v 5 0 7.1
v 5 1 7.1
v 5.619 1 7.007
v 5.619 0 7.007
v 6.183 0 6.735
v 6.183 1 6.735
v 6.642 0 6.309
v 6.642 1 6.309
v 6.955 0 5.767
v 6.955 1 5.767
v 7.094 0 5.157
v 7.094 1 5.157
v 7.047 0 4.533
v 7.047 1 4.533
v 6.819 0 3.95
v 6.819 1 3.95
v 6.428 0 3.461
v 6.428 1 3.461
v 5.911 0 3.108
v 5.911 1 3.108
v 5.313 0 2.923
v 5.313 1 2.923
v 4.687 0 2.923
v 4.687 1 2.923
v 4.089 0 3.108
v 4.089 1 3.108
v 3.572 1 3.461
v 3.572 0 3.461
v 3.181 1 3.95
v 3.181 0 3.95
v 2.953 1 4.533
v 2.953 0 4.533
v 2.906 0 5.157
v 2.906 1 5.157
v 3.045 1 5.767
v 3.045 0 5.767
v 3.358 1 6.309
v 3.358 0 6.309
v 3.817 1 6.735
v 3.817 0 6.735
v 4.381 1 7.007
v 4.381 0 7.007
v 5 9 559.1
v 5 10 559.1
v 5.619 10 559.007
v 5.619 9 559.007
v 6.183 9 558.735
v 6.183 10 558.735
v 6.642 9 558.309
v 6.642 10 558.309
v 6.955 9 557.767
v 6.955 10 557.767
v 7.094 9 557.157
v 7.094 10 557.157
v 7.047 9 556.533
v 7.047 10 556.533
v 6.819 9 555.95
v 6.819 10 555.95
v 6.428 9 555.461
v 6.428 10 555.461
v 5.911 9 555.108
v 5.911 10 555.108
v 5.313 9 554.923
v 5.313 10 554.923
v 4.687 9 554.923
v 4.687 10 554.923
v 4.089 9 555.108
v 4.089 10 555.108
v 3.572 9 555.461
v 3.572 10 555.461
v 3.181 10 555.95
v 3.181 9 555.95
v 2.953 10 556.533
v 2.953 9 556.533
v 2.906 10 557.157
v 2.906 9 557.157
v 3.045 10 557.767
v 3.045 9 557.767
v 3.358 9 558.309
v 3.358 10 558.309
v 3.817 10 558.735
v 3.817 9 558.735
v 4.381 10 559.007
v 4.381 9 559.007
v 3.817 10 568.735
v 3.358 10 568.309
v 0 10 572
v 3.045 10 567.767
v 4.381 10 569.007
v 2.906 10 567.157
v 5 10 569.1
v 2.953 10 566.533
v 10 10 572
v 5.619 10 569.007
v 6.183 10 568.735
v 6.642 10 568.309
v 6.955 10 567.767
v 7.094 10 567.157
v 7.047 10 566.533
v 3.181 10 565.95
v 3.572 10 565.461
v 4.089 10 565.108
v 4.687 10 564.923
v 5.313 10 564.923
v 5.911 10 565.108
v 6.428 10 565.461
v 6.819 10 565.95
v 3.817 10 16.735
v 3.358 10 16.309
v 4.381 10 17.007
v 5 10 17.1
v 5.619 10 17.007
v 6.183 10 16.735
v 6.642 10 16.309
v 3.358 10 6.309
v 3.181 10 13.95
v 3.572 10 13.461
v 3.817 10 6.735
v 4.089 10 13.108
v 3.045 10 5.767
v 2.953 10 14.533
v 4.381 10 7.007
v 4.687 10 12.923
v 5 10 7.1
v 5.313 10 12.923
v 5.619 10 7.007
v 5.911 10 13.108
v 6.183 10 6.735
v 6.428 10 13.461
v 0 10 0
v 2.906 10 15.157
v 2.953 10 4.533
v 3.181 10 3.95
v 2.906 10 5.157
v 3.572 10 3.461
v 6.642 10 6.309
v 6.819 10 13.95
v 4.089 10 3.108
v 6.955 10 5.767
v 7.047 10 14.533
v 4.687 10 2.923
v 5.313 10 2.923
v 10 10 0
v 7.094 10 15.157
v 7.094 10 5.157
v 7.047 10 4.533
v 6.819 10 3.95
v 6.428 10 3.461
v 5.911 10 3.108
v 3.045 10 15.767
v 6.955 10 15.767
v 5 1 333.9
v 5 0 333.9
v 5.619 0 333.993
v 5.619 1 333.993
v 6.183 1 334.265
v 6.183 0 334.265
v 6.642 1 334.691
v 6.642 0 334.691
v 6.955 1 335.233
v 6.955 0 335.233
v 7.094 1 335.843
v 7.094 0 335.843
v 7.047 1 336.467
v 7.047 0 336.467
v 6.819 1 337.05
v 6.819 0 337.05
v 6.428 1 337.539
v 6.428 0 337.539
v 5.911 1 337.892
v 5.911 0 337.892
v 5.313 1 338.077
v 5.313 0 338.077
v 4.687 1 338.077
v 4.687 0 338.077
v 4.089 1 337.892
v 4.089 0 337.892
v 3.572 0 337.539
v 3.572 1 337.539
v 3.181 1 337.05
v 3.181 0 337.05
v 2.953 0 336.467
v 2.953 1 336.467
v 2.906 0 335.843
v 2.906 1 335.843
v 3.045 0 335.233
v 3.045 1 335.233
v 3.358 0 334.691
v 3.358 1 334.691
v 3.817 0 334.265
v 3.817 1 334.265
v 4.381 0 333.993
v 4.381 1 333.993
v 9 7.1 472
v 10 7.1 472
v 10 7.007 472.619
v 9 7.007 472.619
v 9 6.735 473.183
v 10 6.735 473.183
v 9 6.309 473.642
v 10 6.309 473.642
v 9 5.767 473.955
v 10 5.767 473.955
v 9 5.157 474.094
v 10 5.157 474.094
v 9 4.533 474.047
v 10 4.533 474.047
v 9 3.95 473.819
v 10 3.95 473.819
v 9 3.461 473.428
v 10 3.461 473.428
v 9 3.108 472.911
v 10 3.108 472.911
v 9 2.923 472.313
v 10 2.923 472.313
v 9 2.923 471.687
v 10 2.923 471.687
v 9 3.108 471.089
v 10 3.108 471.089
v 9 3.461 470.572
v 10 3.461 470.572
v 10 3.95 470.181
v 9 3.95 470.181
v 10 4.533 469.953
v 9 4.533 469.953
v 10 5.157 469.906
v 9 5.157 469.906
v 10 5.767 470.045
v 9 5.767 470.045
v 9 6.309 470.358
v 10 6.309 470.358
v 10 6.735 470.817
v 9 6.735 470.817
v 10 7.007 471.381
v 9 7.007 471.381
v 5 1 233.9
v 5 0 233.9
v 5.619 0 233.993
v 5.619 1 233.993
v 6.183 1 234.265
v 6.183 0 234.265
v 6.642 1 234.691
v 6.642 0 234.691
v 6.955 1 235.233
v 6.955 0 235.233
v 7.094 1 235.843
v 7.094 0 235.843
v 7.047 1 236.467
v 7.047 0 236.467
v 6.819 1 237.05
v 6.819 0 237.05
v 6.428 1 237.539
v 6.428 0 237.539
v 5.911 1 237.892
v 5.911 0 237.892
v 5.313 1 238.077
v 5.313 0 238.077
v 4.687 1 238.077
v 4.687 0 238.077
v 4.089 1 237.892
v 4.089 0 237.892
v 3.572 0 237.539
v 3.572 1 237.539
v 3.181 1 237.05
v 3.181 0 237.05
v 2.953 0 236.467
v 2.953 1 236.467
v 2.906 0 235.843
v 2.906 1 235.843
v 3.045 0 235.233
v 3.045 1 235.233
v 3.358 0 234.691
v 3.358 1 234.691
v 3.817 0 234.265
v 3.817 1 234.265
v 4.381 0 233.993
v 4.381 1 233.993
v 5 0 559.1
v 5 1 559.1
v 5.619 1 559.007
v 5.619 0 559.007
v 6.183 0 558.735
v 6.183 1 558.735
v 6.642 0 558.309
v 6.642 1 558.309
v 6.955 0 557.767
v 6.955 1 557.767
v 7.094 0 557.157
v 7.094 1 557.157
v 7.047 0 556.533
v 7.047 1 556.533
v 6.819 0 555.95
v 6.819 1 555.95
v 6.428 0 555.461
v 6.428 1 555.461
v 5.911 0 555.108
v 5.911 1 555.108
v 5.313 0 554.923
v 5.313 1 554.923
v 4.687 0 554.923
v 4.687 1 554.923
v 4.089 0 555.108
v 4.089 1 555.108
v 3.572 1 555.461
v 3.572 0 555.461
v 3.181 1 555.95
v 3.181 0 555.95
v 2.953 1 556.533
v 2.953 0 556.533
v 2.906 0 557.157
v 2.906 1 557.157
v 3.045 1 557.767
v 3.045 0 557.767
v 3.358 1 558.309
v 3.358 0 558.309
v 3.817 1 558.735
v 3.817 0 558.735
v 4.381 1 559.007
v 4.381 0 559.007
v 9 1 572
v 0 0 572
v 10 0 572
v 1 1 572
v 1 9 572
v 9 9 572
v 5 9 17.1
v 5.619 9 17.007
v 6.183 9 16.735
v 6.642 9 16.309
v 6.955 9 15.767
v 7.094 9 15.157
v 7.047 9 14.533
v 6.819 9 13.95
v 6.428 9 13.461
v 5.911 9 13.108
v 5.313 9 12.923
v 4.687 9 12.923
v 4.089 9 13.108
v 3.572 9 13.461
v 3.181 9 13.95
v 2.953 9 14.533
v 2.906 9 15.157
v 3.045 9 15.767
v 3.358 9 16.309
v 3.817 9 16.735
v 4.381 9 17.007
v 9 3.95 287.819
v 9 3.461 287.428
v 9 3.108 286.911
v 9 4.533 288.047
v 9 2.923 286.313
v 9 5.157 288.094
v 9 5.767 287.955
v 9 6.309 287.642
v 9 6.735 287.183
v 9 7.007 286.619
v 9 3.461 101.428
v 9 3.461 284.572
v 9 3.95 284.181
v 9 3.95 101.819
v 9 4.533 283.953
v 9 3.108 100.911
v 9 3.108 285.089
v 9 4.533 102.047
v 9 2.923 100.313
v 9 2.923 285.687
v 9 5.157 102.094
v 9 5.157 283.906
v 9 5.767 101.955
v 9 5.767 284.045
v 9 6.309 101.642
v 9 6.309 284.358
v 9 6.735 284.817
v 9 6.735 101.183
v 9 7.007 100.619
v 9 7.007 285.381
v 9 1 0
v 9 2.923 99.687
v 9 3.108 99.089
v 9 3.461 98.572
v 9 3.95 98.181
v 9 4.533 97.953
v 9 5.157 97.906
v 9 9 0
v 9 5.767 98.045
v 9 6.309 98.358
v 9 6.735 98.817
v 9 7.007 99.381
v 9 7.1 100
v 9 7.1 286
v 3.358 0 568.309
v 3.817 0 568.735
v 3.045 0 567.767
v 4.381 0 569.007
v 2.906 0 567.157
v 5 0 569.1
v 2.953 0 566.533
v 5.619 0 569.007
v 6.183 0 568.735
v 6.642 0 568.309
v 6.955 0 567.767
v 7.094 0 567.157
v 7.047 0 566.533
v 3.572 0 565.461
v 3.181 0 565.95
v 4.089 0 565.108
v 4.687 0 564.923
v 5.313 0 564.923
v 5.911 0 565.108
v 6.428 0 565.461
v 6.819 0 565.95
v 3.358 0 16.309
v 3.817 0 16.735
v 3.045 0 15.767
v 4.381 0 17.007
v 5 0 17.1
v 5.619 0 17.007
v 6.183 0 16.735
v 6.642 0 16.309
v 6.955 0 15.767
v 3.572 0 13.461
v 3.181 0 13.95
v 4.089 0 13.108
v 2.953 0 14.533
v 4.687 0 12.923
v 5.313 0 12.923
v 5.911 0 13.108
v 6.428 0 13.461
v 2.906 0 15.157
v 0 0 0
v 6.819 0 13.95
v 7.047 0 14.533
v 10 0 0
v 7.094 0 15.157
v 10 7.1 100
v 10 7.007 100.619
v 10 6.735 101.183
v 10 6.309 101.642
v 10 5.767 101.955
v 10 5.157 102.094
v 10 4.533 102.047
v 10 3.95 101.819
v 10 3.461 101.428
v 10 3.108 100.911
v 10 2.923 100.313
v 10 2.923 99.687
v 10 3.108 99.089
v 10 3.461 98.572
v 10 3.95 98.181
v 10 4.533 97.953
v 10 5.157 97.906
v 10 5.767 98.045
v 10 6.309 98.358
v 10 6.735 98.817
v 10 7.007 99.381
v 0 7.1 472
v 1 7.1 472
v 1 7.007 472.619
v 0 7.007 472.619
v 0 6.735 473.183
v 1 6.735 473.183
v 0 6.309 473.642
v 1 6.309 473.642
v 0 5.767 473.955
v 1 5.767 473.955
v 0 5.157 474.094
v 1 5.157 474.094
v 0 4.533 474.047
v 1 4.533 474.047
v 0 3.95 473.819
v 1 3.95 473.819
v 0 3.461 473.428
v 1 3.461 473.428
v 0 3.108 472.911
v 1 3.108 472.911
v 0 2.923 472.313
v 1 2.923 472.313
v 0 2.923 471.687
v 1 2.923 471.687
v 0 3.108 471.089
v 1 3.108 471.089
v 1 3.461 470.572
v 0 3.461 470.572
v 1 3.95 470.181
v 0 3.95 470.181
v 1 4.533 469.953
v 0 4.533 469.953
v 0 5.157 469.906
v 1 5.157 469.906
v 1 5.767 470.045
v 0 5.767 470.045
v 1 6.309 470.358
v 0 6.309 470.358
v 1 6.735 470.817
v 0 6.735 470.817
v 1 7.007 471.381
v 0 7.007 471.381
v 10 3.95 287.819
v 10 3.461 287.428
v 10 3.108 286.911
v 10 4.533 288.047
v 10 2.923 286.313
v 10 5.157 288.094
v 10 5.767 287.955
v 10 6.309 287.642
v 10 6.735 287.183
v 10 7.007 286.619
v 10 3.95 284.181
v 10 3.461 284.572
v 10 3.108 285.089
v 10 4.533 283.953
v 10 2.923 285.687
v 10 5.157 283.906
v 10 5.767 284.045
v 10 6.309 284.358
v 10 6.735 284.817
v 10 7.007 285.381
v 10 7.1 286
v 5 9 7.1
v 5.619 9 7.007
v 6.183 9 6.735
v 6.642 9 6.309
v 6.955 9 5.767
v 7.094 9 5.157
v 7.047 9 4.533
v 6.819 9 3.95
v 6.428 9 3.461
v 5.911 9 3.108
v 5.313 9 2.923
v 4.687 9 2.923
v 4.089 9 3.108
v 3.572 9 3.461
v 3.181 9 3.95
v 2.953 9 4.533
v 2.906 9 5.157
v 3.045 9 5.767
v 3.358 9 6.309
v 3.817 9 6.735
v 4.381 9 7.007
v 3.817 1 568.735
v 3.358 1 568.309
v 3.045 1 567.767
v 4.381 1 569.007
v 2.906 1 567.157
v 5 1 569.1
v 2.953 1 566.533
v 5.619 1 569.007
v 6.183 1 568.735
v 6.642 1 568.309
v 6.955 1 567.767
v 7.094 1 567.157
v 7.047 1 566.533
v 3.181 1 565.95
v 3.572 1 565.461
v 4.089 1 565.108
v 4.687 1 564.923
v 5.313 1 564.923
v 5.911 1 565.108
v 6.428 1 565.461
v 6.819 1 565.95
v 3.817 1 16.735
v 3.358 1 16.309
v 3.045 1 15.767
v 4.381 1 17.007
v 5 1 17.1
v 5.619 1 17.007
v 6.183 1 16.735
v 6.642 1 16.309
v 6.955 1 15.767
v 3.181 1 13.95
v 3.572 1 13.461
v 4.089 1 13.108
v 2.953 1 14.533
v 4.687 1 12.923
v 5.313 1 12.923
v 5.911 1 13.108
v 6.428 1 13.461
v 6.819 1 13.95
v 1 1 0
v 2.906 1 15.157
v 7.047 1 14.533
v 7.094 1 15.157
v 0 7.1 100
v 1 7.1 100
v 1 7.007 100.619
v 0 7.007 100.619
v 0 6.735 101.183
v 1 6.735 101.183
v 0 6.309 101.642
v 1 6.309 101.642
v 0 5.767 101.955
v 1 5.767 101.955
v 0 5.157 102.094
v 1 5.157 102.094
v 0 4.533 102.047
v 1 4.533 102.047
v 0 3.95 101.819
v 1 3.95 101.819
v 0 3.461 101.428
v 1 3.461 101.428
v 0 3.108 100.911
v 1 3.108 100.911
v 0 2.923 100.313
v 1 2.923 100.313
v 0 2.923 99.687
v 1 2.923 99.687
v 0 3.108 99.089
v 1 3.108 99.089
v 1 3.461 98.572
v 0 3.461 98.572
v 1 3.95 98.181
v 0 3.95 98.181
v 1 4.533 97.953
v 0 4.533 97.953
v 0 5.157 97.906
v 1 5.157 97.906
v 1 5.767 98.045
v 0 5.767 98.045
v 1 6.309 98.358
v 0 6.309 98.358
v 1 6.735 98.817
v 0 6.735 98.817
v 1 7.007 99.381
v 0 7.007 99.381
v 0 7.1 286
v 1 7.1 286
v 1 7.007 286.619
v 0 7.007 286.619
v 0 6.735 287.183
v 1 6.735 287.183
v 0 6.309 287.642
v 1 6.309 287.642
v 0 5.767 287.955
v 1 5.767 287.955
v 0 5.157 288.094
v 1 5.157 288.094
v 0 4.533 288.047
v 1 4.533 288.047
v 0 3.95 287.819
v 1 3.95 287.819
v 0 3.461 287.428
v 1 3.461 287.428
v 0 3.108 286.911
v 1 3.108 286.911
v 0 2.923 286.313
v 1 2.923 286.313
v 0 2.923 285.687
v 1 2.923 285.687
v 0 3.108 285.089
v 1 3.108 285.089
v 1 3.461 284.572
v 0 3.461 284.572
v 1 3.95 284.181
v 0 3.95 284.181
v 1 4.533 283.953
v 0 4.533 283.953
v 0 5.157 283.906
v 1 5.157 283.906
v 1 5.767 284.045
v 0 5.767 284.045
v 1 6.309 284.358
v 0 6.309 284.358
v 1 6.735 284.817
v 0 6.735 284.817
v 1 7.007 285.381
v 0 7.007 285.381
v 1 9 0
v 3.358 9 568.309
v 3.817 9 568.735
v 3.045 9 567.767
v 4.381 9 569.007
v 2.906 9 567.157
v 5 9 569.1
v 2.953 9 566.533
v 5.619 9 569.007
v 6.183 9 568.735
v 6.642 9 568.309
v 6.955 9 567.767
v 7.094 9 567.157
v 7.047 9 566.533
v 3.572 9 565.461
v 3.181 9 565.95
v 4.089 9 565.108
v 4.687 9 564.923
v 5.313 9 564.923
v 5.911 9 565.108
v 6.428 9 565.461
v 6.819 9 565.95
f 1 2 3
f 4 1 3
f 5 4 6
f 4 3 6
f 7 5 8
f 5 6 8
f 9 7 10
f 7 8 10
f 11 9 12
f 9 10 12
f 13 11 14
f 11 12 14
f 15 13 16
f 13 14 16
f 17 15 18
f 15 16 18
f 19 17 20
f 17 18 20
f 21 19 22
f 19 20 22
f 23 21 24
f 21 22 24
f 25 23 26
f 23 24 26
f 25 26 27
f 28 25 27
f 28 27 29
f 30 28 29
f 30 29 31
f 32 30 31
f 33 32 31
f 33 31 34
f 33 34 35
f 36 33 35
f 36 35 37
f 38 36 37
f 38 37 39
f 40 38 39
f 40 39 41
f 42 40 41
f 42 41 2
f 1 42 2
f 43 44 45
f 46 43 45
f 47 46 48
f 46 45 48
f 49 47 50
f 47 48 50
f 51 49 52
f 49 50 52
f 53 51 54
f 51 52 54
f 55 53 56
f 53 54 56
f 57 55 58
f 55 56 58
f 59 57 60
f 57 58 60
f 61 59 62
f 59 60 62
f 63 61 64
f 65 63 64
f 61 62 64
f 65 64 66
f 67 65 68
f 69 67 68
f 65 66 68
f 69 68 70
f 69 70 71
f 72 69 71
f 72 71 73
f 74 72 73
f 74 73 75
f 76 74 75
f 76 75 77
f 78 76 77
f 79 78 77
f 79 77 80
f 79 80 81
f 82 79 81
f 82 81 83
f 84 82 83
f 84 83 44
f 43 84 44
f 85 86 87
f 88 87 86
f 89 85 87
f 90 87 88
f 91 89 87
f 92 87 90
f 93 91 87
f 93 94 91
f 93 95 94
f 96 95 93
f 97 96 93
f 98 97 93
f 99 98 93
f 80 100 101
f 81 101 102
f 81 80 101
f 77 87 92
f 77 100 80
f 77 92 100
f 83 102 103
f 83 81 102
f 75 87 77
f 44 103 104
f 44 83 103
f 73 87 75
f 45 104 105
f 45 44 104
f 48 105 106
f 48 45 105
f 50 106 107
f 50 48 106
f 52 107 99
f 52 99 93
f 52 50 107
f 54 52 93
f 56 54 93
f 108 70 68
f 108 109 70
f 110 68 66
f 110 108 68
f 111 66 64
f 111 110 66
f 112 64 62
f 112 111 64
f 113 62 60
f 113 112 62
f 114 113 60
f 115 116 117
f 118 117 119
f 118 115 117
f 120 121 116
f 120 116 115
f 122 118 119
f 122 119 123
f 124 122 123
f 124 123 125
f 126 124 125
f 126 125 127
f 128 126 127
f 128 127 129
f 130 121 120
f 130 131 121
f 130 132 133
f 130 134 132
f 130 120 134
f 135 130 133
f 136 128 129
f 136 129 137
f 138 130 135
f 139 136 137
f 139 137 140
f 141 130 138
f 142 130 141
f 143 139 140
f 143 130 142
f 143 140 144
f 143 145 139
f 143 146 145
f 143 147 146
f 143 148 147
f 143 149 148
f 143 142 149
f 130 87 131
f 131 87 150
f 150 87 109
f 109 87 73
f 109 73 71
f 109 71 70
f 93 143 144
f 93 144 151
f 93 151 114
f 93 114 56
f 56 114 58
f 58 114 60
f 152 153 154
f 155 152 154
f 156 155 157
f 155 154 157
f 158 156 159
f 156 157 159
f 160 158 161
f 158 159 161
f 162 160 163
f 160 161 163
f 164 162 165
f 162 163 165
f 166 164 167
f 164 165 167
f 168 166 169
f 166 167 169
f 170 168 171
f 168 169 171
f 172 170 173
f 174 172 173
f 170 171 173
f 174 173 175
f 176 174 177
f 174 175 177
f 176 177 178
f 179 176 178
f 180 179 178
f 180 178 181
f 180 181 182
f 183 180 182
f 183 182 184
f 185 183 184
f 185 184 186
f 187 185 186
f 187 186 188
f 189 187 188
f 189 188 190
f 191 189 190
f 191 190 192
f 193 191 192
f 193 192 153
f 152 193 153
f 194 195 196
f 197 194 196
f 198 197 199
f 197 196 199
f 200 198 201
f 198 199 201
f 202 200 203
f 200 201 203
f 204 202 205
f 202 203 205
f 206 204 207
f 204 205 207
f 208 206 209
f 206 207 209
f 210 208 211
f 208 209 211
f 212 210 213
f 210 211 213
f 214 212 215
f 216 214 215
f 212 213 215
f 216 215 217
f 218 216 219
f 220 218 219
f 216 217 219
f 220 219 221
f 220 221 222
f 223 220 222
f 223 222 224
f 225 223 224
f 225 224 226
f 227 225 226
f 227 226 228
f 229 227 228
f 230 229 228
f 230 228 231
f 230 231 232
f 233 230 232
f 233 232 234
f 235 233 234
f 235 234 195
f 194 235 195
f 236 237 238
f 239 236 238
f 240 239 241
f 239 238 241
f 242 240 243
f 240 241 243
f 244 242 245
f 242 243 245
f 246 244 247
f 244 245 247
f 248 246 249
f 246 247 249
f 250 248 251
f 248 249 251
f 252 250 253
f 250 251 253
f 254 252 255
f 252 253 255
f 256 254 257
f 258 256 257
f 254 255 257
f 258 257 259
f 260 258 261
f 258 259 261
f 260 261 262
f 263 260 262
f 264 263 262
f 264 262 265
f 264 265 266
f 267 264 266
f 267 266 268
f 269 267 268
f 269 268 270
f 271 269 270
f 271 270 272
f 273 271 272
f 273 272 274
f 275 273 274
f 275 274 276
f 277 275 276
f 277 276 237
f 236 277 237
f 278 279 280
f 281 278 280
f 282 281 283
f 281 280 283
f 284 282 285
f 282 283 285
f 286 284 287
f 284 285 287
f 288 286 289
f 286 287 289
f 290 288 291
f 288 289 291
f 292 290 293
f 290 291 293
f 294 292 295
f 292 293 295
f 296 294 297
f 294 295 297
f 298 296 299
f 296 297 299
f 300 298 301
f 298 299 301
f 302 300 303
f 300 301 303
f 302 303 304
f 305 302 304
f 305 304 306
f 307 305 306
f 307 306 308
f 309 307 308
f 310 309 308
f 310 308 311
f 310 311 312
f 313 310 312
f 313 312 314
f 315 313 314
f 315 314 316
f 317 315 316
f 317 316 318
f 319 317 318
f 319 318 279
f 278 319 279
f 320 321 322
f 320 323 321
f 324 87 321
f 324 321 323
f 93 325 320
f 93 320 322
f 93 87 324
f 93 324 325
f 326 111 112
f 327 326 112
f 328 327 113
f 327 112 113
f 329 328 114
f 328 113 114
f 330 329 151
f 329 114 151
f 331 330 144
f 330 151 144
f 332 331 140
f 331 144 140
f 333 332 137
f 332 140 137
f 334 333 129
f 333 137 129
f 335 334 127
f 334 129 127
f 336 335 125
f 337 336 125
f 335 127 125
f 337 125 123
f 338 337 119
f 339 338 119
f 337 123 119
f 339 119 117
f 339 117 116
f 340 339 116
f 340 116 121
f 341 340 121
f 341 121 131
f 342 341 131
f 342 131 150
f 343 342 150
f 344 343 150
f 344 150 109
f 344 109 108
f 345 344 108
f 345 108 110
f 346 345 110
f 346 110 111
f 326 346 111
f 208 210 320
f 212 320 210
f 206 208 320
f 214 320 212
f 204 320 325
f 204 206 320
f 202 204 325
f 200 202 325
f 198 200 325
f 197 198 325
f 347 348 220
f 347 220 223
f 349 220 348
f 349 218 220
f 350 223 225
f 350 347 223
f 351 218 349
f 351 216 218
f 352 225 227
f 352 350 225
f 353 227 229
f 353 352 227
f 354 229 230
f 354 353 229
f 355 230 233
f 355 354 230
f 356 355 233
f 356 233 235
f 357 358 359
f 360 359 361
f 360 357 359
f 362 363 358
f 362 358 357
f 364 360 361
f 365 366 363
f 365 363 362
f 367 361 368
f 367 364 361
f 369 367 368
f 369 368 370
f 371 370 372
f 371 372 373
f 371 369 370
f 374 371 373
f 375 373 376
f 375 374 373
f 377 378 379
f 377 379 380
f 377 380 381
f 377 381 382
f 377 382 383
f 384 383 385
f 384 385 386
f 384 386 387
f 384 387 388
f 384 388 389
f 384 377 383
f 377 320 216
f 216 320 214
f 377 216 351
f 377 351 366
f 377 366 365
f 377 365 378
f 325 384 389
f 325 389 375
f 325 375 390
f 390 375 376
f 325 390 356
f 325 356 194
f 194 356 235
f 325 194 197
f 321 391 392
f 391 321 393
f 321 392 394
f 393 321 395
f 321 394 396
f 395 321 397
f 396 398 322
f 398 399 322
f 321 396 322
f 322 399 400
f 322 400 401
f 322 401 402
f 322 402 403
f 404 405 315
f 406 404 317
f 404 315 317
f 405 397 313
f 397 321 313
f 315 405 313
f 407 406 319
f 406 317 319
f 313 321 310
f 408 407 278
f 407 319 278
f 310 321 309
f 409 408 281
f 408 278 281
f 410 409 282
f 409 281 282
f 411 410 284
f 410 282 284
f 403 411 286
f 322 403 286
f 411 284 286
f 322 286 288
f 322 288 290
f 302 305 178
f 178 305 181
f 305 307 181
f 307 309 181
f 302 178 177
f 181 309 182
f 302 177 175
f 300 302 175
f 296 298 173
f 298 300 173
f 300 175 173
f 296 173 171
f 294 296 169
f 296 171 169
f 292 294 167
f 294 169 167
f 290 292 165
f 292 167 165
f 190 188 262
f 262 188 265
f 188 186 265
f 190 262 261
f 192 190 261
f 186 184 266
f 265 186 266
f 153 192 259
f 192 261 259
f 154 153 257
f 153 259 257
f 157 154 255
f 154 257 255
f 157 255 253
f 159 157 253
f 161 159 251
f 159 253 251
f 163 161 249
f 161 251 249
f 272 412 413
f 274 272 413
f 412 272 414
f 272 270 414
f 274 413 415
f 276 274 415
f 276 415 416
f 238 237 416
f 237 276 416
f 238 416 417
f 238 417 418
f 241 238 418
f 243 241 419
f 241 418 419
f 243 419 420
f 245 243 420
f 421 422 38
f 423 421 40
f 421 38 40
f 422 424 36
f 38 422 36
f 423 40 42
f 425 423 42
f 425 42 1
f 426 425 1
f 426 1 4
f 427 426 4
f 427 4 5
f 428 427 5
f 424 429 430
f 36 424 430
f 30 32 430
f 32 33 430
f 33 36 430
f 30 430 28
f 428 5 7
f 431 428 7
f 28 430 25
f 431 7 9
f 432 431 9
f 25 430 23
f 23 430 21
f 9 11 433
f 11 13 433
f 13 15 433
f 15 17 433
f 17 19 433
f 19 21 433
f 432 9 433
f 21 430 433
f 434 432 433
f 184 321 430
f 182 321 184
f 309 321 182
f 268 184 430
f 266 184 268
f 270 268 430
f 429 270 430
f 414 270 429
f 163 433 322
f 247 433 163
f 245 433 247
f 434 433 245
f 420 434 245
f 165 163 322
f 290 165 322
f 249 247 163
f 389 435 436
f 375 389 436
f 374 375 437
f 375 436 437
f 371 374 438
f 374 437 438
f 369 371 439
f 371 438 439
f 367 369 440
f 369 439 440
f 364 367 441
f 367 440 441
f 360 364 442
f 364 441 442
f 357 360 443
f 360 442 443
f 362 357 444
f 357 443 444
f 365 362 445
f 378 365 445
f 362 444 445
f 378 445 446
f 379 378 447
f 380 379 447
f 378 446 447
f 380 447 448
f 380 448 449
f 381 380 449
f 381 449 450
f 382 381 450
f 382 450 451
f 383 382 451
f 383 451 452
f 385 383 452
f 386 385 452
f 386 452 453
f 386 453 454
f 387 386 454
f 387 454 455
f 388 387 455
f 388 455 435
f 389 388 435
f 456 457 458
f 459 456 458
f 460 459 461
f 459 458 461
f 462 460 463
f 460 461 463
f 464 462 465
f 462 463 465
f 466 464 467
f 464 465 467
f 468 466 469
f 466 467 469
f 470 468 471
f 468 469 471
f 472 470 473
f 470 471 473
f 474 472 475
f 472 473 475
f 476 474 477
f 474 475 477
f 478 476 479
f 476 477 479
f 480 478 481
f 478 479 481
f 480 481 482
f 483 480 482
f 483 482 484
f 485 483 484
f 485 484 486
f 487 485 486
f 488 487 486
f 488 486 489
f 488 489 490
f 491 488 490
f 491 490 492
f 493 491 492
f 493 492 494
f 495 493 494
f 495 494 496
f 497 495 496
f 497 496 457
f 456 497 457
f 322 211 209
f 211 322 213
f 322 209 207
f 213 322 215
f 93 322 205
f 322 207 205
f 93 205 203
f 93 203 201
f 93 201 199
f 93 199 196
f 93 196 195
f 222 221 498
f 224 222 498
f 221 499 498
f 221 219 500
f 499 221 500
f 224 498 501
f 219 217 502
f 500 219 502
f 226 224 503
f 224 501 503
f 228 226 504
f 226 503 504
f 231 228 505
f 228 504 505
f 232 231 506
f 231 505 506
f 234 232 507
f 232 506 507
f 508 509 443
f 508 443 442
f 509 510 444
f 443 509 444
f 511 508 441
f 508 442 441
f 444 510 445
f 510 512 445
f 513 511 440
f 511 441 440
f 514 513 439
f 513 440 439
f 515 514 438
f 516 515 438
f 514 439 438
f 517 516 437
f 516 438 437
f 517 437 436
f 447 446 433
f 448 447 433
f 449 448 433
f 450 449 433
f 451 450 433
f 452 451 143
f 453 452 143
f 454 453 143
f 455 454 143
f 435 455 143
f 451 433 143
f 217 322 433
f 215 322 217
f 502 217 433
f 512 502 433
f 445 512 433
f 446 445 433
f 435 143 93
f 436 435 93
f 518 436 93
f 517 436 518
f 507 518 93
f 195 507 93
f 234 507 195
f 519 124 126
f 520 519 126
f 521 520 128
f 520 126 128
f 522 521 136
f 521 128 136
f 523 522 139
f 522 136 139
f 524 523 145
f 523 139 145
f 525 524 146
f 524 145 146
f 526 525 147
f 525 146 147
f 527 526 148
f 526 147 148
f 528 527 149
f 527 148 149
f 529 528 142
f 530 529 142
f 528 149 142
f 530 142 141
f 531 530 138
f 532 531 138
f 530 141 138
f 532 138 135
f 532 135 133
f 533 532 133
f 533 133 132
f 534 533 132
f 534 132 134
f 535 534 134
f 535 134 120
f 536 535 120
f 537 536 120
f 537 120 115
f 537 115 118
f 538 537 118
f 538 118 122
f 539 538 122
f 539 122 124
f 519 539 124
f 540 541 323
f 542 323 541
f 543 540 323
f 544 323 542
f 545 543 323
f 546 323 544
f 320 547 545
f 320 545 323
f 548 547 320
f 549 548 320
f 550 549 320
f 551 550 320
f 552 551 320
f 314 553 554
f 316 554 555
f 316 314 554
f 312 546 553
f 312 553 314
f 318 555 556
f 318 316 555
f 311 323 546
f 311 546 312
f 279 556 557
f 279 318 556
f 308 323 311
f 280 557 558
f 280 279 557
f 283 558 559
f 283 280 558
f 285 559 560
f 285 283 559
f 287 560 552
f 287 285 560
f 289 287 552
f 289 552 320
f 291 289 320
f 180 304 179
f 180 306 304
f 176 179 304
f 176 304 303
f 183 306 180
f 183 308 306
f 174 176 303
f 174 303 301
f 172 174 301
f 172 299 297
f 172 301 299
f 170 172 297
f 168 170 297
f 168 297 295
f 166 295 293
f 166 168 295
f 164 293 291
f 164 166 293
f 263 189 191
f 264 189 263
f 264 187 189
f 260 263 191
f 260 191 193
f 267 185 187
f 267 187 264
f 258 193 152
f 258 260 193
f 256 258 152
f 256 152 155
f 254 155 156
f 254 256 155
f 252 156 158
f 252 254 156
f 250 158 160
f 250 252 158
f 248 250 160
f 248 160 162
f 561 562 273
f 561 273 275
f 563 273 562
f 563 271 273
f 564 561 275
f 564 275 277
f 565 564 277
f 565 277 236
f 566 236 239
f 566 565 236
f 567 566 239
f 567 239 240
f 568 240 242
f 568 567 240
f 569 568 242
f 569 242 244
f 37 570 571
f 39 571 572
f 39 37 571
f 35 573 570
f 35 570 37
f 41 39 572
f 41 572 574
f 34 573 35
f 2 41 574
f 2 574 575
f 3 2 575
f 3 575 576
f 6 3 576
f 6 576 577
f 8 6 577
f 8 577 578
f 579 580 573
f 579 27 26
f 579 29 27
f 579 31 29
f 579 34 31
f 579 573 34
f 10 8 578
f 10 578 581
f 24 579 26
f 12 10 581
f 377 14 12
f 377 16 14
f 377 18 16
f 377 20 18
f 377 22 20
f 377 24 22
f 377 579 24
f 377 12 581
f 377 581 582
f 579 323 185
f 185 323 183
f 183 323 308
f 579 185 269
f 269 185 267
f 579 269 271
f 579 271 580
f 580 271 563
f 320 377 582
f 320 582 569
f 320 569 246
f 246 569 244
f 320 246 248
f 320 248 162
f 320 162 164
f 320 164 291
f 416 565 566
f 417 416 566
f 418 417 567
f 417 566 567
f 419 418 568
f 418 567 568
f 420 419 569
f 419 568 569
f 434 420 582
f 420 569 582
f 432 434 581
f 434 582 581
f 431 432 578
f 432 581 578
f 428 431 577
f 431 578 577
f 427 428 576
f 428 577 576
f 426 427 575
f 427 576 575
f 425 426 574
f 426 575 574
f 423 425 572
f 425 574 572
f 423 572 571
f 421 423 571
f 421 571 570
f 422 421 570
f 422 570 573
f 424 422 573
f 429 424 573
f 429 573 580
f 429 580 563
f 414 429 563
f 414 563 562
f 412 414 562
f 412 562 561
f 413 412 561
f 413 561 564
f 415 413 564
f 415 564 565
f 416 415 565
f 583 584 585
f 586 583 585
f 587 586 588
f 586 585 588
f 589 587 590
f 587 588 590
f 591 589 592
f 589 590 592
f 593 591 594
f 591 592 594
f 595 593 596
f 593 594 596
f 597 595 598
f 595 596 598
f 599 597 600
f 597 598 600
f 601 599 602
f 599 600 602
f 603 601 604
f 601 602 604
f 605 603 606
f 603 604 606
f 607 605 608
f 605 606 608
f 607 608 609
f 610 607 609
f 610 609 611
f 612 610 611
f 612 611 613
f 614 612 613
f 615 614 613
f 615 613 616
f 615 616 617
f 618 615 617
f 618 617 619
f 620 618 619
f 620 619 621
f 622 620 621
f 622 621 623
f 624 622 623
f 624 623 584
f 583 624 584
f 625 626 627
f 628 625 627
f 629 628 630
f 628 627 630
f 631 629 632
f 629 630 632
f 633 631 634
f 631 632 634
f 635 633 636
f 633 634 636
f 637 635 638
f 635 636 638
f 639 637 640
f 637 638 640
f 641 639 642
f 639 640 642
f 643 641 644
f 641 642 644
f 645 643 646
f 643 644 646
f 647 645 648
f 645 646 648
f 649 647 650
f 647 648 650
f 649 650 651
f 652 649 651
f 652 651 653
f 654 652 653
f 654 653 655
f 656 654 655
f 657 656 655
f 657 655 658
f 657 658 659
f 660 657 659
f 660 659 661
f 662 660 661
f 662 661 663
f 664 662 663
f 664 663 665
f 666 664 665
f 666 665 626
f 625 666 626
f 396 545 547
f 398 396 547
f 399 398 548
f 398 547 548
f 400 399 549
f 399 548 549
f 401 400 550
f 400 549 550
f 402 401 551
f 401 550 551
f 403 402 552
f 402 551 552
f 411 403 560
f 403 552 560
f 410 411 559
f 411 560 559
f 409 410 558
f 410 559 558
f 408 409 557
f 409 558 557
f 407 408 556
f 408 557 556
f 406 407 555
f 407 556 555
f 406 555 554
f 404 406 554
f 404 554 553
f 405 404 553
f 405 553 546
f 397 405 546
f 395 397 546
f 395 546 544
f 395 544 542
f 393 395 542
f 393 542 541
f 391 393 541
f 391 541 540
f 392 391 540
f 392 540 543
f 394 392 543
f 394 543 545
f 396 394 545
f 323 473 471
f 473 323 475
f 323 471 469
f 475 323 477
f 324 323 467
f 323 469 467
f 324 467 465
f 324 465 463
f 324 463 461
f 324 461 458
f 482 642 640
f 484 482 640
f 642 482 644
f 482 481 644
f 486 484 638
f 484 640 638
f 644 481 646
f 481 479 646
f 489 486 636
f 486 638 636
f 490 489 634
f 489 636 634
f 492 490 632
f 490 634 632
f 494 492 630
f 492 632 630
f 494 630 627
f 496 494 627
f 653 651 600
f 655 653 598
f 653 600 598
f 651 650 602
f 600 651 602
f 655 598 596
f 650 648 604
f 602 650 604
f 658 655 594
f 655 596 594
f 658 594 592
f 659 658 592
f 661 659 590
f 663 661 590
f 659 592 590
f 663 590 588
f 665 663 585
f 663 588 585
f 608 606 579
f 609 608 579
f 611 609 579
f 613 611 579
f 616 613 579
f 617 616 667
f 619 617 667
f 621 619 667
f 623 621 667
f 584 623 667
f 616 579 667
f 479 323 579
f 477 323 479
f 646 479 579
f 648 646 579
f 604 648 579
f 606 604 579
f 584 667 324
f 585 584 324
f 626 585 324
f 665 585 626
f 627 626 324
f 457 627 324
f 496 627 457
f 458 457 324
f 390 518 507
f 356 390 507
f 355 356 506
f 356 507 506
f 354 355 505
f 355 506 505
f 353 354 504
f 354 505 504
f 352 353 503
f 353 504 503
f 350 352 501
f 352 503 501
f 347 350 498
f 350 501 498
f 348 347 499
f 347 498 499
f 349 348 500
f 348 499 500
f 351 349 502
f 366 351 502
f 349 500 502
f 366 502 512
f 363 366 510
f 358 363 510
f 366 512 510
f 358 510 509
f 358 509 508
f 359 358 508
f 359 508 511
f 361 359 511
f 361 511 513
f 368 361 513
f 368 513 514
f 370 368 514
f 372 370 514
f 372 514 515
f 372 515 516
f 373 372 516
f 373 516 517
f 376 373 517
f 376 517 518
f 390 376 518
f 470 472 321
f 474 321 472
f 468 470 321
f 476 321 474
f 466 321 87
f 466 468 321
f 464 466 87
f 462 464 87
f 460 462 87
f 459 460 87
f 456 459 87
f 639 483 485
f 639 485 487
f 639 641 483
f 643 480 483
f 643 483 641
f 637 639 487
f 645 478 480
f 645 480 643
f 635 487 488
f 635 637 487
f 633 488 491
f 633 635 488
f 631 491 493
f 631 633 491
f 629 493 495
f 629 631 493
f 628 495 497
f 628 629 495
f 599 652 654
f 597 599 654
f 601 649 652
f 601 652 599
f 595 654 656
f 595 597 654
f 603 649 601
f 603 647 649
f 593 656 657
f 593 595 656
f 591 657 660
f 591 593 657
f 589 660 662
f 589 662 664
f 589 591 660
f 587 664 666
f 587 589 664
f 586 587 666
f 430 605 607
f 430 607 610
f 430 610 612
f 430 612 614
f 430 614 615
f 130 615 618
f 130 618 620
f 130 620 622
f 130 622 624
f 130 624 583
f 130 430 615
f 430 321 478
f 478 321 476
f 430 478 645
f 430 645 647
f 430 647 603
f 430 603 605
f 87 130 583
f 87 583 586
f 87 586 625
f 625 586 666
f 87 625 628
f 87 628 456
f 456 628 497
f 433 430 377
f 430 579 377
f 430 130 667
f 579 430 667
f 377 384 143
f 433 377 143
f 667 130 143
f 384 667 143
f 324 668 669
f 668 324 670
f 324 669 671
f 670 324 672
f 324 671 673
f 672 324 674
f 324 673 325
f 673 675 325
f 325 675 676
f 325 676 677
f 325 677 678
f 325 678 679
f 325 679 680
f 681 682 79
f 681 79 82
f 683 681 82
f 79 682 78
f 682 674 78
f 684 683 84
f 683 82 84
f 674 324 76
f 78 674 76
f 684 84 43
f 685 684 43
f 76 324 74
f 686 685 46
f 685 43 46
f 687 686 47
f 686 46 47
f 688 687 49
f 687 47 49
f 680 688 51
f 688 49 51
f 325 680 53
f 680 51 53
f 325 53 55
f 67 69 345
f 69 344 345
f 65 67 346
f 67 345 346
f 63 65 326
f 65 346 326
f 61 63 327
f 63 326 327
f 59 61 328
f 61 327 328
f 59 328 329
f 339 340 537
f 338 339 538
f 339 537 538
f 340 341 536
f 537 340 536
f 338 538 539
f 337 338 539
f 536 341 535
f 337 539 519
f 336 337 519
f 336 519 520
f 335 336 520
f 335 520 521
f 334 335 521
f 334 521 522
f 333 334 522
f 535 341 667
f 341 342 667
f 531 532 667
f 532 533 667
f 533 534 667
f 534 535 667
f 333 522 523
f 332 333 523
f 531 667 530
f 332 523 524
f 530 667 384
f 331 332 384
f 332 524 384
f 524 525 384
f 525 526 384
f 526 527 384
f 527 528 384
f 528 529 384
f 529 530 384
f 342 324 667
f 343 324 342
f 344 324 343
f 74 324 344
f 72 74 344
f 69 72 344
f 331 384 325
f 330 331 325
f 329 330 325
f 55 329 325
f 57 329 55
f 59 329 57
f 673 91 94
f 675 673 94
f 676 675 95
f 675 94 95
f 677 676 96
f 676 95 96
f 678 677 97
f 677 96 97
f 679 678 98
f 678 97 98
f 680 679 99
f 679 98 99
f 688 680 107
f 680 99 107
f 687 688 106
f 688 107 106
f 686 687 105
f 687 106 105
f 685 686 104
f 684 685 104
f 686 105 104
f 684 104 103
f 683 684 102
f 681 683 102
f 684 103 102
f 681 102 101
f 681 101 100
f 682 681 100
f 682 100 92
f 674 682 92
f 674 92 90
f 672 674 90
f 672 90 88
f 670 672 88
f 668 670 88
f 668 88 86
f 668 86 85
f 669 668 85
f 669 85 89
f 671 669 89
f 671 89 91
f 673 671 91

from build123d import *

# Parameters (mm, degrees)
SKETCH1_W           = 10
SKETCH1_H           = 10
SKETCH1_W_2         = 8
SKETCH1_H_2         = 8
BOSS_EXTRUDE1_DEPTH = 572
SKETCH2_R           = 2.1
CUT_EXTRUDE1_DEPTH  = 116
SKETCH3_R           = 2.1
CUT_EXTRUDE2_DEPTH  = 5
SKETCH5_R           = 2.1
CUT_EXTRUDE3_DEPTH  = 10


with BuildPart() as part:
    # Sketch1 → Boss-Extrude1 (new body)
    with BuildSketch(Plane.XY):
        with Locations((5, 5)):
            Rectangle(SKETCH1_W, SKETCH1_H)
        with Locations((5, 5)):
            Rectangle(SKETCH1_W_2, SKETCH1_H_2, mode=Mode.SUBTRACT)
    extrude(amount=BOSS_EXTRUDE1_DEPTH)

    # Sketch2 → Cut-Extrude1 (cut)
    with BuildSketch(Plane(origin=(0, 10, 0), x_dir=(1, 0, 0), z_dir=(0, 1, 0))):
        with Locations(Location((5, -5, 0), (0, 0, 270))):
            Circle(SKETCH2_R)
        with Locations(Location((5, -15, 0), (0, 0, 270))):
            Circle(SKETCH2_R)
        with Locations(Location((5, -557, 0), (0, 0, 270))):
            Circle(SKETCH2_R)
        with Locations(Location((5, -567, 0), (0, 0, 270))):
            Circle(SKETCH2_R)
    extrude(amount=-CUT_EXTRUDE1_DEPTH, mode=Mode.SUBTRACT)

    # Sketch3 → Cut-Extrude2 (cut)
    with BuildSketch(Plane.XZ):
        with Locations(Location((5, 336, 0), (0, 0, 270))):
            Circle(SKETCH3_R)
        with Locations(Location((5, 236, 0), (0, 0, 270))):
            Circle(SKETCH3_R)
    extrude(amount=-CUT_EXTRUDE2_DEPTH, mode=Mode.SUBTRACT)

    # Sketch5 → Cut-Extrude3 (cut)
    with BuildSketch(Plane(origin=(10, 0, 0), x_dir=(0, 0, -1), z_dir=(1, 0, 0))):
        with Locations(Location((-472, 5, 0), (0, 0, 90))):
            Circle(SKETCH5_R)
        with Locations(Location((-100, 5, 0), (0, 0, 90))):
            Circle(SKETCH5_R)
        with Locations(Location((-286, 5, 0), (0, 0, 90))):
            Circle(SKETCH5_R)
    extrude(amount=-CUT_EXTRUDE3_DEPTH, mode=Mode.SUBTRACT)


solid = part.part
